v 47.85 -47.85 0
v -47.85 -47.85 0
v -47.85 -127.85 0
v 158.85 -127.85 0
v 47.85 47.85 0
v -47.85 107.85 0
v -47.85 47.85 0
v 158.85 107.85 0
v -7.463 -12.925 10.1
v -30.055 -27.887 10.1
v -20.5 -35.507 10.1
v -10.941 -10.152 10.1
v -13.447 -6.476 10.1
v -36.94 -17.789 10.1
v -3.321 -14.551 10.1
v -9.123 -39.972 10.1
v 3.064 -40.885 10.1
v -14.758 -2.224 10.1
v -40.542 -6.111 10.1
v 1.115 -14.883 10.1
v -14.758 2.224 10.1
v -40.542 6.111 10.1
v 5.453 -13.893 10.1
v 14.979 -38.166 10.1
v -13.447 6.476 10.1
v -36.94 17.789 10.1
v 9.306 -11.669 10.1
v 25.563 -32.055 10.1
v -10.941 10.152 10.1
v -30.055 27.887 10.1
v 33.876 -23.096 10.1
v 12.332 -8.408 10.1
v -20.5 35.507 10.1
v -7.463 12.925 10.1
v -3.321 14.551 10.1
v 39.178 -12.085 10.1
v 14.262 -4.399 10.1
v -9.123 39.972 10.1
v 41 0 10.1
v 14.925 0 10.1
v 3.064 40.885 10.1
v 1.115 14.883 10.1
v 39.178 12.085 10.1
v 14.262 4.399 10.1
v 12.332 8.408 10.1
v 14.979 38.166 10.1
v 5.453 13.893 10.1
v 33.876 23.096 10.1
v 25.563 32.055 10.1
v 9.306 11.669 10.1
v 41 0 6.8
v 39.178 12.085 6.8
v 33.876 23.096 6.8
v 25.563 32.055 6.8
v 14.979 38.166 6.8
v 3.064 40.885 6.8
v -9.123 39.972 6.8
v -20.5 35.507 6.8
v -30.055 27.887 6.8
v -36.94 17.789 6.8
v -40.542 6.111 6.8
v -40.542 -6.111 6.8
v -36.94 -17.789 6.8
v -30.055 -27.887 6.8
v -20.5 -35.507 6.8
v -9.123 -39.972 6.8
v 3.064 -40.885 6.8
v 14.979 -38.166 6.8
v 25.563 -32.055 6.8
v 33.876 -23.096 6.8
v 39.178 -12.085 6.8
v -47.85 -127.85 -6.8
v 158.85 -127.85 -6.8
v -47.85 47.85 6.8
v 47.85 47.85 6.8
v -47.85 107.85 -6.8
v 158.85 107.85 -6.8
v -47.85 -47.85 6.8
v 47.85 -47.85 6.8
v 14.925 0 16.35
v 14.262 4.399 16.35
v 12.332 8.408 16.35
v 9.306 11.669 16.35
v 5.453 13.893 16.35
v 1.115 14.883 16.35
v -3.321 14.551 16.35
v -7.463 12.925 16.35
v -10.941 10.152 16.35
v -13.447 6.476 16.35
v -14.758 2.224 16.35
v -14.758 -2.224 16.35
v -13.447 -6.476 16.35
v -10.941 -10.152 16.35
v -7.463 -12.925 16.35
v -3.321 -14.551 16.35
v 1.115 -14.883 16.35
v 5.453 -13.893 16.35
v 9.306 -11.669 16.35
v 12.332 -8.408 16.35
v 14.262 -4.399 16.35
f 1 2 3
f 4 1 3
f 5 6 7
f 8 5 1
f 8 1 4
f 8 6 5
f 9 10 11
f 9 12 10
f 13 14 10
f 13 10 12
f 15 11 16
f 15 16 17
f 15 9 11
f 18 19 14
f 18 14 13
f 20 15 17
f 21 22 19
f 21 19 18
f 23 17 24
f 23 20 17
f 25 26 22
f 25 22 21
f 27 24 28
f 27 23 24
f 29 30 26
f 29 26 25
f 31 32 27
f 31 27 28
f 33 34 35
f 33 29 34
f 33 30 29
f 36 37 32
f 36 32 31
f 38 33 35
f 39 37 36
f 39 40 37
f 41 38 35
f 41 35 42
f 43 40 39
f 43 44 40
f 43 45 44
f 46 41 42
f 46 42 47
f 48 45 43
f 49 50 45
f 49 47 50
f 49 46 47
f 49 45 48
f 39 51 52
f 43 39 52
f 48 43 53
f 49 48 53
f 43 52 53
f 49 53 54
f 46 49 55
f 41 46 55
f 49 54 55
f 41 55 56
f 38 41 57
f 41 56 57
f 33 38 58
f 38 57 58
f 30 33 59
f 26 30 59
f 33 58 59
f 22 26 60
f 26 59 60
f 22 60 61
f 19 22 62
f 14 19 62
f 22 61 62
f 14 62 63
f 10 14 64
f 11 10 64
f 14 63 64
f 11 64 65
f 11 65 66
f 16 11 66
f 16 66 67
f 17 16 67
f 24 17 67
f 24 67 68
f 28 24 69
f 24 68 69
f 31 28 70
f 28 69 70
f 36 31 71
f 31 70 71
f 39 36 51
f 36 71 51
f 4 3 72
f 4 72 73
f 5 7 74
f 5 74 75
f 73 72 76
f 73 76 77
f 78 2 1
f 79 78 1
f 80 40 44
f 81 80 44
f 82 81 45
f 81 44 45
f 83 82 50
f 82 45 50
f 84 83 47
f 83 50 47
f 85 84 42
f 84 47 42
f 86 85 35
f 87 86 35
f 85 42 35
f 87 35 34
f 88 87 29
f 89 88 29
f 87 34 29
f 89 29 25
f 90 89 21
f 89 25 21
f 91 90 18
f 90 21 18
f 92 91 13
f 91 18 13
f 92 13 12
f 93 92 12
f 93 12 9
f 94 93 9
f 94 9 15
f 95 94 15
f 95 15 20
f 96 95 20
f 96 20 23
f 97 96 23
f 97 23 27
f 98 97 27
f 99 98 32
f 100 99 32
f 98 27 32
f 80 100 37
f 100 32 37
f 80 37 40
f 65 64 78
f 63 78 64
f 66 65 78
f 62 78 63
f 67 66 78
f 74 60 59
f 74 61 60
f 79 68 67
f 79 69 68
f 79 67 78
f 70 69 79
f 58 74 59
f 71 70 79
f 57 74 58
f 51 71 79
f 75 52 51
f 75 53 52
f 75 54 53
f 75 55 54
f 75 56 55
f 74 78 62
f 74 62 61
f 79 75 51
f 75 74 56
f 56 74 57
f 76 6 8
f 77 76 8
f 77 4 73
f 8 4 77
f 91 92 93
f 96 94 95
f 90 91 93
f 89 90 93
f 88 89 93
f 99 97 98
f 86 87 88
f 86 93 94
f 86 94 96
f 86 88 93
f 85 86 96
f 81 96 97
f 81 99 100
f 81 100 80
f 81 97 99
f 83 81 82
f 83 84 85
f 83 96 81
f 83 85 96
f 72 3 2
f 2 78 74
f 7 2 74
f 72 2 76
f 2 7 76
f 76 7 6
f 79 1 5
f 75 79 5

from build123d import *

# Parameters (mm, degrees)
SKETCH1_W           = 95.7
SKETCH1_H           = 95.7
BOSS_EXTRUDE1_DEPTH = 6.8
SKETCH2_W           = 206.7
SKETCH2_H           = 235.7
BOSS_EXTRUDE2_DEPTH = 6.8
SKETCH3_R           = 41
BOSS_EXTRUDE3_DEPTH = 3.3
SKETCH4_R           = 14.925
BOSS_EXTRUDE4_DEPTH = 6.25


with BuildPart() as part:
    # Sketch1 → Boss-Extrude1 (new body)
    with BuildSketch(Plane.XY):
        Rectangle(SKETCH1_W, SKETCH1_H)
    extrude(amount=BOSS_EXTRUDE1_DEPTH)

    # Sketch2 → Boss-Extrude2 (add)
    with BuildSketch(Plane.XY):
        with Locations((55.5, -10)):
            Rectangle(SKETCH2_W, SKETCH2_H)
    extrude(amount=-BOSS_EXTRUDE2_DEPTH)

    # Sketch3 → Boss-Extrude3 (add)
    with BuildSketch(Plane.XY.offset(6.8)):
        Circle(SKETCH3_R)
    extrude(amount=BOSS_EXTRUDE3_DEPTH)

    # Sketch4 → Boss-Extrude4 (add)
    with BuildSketch(Plane.XY.offset(10.1)):
        Circle(SKETCH4_R)
    extrude(amount=BOSS_EXTRUDE4_DEPTH)


solid = part.part
